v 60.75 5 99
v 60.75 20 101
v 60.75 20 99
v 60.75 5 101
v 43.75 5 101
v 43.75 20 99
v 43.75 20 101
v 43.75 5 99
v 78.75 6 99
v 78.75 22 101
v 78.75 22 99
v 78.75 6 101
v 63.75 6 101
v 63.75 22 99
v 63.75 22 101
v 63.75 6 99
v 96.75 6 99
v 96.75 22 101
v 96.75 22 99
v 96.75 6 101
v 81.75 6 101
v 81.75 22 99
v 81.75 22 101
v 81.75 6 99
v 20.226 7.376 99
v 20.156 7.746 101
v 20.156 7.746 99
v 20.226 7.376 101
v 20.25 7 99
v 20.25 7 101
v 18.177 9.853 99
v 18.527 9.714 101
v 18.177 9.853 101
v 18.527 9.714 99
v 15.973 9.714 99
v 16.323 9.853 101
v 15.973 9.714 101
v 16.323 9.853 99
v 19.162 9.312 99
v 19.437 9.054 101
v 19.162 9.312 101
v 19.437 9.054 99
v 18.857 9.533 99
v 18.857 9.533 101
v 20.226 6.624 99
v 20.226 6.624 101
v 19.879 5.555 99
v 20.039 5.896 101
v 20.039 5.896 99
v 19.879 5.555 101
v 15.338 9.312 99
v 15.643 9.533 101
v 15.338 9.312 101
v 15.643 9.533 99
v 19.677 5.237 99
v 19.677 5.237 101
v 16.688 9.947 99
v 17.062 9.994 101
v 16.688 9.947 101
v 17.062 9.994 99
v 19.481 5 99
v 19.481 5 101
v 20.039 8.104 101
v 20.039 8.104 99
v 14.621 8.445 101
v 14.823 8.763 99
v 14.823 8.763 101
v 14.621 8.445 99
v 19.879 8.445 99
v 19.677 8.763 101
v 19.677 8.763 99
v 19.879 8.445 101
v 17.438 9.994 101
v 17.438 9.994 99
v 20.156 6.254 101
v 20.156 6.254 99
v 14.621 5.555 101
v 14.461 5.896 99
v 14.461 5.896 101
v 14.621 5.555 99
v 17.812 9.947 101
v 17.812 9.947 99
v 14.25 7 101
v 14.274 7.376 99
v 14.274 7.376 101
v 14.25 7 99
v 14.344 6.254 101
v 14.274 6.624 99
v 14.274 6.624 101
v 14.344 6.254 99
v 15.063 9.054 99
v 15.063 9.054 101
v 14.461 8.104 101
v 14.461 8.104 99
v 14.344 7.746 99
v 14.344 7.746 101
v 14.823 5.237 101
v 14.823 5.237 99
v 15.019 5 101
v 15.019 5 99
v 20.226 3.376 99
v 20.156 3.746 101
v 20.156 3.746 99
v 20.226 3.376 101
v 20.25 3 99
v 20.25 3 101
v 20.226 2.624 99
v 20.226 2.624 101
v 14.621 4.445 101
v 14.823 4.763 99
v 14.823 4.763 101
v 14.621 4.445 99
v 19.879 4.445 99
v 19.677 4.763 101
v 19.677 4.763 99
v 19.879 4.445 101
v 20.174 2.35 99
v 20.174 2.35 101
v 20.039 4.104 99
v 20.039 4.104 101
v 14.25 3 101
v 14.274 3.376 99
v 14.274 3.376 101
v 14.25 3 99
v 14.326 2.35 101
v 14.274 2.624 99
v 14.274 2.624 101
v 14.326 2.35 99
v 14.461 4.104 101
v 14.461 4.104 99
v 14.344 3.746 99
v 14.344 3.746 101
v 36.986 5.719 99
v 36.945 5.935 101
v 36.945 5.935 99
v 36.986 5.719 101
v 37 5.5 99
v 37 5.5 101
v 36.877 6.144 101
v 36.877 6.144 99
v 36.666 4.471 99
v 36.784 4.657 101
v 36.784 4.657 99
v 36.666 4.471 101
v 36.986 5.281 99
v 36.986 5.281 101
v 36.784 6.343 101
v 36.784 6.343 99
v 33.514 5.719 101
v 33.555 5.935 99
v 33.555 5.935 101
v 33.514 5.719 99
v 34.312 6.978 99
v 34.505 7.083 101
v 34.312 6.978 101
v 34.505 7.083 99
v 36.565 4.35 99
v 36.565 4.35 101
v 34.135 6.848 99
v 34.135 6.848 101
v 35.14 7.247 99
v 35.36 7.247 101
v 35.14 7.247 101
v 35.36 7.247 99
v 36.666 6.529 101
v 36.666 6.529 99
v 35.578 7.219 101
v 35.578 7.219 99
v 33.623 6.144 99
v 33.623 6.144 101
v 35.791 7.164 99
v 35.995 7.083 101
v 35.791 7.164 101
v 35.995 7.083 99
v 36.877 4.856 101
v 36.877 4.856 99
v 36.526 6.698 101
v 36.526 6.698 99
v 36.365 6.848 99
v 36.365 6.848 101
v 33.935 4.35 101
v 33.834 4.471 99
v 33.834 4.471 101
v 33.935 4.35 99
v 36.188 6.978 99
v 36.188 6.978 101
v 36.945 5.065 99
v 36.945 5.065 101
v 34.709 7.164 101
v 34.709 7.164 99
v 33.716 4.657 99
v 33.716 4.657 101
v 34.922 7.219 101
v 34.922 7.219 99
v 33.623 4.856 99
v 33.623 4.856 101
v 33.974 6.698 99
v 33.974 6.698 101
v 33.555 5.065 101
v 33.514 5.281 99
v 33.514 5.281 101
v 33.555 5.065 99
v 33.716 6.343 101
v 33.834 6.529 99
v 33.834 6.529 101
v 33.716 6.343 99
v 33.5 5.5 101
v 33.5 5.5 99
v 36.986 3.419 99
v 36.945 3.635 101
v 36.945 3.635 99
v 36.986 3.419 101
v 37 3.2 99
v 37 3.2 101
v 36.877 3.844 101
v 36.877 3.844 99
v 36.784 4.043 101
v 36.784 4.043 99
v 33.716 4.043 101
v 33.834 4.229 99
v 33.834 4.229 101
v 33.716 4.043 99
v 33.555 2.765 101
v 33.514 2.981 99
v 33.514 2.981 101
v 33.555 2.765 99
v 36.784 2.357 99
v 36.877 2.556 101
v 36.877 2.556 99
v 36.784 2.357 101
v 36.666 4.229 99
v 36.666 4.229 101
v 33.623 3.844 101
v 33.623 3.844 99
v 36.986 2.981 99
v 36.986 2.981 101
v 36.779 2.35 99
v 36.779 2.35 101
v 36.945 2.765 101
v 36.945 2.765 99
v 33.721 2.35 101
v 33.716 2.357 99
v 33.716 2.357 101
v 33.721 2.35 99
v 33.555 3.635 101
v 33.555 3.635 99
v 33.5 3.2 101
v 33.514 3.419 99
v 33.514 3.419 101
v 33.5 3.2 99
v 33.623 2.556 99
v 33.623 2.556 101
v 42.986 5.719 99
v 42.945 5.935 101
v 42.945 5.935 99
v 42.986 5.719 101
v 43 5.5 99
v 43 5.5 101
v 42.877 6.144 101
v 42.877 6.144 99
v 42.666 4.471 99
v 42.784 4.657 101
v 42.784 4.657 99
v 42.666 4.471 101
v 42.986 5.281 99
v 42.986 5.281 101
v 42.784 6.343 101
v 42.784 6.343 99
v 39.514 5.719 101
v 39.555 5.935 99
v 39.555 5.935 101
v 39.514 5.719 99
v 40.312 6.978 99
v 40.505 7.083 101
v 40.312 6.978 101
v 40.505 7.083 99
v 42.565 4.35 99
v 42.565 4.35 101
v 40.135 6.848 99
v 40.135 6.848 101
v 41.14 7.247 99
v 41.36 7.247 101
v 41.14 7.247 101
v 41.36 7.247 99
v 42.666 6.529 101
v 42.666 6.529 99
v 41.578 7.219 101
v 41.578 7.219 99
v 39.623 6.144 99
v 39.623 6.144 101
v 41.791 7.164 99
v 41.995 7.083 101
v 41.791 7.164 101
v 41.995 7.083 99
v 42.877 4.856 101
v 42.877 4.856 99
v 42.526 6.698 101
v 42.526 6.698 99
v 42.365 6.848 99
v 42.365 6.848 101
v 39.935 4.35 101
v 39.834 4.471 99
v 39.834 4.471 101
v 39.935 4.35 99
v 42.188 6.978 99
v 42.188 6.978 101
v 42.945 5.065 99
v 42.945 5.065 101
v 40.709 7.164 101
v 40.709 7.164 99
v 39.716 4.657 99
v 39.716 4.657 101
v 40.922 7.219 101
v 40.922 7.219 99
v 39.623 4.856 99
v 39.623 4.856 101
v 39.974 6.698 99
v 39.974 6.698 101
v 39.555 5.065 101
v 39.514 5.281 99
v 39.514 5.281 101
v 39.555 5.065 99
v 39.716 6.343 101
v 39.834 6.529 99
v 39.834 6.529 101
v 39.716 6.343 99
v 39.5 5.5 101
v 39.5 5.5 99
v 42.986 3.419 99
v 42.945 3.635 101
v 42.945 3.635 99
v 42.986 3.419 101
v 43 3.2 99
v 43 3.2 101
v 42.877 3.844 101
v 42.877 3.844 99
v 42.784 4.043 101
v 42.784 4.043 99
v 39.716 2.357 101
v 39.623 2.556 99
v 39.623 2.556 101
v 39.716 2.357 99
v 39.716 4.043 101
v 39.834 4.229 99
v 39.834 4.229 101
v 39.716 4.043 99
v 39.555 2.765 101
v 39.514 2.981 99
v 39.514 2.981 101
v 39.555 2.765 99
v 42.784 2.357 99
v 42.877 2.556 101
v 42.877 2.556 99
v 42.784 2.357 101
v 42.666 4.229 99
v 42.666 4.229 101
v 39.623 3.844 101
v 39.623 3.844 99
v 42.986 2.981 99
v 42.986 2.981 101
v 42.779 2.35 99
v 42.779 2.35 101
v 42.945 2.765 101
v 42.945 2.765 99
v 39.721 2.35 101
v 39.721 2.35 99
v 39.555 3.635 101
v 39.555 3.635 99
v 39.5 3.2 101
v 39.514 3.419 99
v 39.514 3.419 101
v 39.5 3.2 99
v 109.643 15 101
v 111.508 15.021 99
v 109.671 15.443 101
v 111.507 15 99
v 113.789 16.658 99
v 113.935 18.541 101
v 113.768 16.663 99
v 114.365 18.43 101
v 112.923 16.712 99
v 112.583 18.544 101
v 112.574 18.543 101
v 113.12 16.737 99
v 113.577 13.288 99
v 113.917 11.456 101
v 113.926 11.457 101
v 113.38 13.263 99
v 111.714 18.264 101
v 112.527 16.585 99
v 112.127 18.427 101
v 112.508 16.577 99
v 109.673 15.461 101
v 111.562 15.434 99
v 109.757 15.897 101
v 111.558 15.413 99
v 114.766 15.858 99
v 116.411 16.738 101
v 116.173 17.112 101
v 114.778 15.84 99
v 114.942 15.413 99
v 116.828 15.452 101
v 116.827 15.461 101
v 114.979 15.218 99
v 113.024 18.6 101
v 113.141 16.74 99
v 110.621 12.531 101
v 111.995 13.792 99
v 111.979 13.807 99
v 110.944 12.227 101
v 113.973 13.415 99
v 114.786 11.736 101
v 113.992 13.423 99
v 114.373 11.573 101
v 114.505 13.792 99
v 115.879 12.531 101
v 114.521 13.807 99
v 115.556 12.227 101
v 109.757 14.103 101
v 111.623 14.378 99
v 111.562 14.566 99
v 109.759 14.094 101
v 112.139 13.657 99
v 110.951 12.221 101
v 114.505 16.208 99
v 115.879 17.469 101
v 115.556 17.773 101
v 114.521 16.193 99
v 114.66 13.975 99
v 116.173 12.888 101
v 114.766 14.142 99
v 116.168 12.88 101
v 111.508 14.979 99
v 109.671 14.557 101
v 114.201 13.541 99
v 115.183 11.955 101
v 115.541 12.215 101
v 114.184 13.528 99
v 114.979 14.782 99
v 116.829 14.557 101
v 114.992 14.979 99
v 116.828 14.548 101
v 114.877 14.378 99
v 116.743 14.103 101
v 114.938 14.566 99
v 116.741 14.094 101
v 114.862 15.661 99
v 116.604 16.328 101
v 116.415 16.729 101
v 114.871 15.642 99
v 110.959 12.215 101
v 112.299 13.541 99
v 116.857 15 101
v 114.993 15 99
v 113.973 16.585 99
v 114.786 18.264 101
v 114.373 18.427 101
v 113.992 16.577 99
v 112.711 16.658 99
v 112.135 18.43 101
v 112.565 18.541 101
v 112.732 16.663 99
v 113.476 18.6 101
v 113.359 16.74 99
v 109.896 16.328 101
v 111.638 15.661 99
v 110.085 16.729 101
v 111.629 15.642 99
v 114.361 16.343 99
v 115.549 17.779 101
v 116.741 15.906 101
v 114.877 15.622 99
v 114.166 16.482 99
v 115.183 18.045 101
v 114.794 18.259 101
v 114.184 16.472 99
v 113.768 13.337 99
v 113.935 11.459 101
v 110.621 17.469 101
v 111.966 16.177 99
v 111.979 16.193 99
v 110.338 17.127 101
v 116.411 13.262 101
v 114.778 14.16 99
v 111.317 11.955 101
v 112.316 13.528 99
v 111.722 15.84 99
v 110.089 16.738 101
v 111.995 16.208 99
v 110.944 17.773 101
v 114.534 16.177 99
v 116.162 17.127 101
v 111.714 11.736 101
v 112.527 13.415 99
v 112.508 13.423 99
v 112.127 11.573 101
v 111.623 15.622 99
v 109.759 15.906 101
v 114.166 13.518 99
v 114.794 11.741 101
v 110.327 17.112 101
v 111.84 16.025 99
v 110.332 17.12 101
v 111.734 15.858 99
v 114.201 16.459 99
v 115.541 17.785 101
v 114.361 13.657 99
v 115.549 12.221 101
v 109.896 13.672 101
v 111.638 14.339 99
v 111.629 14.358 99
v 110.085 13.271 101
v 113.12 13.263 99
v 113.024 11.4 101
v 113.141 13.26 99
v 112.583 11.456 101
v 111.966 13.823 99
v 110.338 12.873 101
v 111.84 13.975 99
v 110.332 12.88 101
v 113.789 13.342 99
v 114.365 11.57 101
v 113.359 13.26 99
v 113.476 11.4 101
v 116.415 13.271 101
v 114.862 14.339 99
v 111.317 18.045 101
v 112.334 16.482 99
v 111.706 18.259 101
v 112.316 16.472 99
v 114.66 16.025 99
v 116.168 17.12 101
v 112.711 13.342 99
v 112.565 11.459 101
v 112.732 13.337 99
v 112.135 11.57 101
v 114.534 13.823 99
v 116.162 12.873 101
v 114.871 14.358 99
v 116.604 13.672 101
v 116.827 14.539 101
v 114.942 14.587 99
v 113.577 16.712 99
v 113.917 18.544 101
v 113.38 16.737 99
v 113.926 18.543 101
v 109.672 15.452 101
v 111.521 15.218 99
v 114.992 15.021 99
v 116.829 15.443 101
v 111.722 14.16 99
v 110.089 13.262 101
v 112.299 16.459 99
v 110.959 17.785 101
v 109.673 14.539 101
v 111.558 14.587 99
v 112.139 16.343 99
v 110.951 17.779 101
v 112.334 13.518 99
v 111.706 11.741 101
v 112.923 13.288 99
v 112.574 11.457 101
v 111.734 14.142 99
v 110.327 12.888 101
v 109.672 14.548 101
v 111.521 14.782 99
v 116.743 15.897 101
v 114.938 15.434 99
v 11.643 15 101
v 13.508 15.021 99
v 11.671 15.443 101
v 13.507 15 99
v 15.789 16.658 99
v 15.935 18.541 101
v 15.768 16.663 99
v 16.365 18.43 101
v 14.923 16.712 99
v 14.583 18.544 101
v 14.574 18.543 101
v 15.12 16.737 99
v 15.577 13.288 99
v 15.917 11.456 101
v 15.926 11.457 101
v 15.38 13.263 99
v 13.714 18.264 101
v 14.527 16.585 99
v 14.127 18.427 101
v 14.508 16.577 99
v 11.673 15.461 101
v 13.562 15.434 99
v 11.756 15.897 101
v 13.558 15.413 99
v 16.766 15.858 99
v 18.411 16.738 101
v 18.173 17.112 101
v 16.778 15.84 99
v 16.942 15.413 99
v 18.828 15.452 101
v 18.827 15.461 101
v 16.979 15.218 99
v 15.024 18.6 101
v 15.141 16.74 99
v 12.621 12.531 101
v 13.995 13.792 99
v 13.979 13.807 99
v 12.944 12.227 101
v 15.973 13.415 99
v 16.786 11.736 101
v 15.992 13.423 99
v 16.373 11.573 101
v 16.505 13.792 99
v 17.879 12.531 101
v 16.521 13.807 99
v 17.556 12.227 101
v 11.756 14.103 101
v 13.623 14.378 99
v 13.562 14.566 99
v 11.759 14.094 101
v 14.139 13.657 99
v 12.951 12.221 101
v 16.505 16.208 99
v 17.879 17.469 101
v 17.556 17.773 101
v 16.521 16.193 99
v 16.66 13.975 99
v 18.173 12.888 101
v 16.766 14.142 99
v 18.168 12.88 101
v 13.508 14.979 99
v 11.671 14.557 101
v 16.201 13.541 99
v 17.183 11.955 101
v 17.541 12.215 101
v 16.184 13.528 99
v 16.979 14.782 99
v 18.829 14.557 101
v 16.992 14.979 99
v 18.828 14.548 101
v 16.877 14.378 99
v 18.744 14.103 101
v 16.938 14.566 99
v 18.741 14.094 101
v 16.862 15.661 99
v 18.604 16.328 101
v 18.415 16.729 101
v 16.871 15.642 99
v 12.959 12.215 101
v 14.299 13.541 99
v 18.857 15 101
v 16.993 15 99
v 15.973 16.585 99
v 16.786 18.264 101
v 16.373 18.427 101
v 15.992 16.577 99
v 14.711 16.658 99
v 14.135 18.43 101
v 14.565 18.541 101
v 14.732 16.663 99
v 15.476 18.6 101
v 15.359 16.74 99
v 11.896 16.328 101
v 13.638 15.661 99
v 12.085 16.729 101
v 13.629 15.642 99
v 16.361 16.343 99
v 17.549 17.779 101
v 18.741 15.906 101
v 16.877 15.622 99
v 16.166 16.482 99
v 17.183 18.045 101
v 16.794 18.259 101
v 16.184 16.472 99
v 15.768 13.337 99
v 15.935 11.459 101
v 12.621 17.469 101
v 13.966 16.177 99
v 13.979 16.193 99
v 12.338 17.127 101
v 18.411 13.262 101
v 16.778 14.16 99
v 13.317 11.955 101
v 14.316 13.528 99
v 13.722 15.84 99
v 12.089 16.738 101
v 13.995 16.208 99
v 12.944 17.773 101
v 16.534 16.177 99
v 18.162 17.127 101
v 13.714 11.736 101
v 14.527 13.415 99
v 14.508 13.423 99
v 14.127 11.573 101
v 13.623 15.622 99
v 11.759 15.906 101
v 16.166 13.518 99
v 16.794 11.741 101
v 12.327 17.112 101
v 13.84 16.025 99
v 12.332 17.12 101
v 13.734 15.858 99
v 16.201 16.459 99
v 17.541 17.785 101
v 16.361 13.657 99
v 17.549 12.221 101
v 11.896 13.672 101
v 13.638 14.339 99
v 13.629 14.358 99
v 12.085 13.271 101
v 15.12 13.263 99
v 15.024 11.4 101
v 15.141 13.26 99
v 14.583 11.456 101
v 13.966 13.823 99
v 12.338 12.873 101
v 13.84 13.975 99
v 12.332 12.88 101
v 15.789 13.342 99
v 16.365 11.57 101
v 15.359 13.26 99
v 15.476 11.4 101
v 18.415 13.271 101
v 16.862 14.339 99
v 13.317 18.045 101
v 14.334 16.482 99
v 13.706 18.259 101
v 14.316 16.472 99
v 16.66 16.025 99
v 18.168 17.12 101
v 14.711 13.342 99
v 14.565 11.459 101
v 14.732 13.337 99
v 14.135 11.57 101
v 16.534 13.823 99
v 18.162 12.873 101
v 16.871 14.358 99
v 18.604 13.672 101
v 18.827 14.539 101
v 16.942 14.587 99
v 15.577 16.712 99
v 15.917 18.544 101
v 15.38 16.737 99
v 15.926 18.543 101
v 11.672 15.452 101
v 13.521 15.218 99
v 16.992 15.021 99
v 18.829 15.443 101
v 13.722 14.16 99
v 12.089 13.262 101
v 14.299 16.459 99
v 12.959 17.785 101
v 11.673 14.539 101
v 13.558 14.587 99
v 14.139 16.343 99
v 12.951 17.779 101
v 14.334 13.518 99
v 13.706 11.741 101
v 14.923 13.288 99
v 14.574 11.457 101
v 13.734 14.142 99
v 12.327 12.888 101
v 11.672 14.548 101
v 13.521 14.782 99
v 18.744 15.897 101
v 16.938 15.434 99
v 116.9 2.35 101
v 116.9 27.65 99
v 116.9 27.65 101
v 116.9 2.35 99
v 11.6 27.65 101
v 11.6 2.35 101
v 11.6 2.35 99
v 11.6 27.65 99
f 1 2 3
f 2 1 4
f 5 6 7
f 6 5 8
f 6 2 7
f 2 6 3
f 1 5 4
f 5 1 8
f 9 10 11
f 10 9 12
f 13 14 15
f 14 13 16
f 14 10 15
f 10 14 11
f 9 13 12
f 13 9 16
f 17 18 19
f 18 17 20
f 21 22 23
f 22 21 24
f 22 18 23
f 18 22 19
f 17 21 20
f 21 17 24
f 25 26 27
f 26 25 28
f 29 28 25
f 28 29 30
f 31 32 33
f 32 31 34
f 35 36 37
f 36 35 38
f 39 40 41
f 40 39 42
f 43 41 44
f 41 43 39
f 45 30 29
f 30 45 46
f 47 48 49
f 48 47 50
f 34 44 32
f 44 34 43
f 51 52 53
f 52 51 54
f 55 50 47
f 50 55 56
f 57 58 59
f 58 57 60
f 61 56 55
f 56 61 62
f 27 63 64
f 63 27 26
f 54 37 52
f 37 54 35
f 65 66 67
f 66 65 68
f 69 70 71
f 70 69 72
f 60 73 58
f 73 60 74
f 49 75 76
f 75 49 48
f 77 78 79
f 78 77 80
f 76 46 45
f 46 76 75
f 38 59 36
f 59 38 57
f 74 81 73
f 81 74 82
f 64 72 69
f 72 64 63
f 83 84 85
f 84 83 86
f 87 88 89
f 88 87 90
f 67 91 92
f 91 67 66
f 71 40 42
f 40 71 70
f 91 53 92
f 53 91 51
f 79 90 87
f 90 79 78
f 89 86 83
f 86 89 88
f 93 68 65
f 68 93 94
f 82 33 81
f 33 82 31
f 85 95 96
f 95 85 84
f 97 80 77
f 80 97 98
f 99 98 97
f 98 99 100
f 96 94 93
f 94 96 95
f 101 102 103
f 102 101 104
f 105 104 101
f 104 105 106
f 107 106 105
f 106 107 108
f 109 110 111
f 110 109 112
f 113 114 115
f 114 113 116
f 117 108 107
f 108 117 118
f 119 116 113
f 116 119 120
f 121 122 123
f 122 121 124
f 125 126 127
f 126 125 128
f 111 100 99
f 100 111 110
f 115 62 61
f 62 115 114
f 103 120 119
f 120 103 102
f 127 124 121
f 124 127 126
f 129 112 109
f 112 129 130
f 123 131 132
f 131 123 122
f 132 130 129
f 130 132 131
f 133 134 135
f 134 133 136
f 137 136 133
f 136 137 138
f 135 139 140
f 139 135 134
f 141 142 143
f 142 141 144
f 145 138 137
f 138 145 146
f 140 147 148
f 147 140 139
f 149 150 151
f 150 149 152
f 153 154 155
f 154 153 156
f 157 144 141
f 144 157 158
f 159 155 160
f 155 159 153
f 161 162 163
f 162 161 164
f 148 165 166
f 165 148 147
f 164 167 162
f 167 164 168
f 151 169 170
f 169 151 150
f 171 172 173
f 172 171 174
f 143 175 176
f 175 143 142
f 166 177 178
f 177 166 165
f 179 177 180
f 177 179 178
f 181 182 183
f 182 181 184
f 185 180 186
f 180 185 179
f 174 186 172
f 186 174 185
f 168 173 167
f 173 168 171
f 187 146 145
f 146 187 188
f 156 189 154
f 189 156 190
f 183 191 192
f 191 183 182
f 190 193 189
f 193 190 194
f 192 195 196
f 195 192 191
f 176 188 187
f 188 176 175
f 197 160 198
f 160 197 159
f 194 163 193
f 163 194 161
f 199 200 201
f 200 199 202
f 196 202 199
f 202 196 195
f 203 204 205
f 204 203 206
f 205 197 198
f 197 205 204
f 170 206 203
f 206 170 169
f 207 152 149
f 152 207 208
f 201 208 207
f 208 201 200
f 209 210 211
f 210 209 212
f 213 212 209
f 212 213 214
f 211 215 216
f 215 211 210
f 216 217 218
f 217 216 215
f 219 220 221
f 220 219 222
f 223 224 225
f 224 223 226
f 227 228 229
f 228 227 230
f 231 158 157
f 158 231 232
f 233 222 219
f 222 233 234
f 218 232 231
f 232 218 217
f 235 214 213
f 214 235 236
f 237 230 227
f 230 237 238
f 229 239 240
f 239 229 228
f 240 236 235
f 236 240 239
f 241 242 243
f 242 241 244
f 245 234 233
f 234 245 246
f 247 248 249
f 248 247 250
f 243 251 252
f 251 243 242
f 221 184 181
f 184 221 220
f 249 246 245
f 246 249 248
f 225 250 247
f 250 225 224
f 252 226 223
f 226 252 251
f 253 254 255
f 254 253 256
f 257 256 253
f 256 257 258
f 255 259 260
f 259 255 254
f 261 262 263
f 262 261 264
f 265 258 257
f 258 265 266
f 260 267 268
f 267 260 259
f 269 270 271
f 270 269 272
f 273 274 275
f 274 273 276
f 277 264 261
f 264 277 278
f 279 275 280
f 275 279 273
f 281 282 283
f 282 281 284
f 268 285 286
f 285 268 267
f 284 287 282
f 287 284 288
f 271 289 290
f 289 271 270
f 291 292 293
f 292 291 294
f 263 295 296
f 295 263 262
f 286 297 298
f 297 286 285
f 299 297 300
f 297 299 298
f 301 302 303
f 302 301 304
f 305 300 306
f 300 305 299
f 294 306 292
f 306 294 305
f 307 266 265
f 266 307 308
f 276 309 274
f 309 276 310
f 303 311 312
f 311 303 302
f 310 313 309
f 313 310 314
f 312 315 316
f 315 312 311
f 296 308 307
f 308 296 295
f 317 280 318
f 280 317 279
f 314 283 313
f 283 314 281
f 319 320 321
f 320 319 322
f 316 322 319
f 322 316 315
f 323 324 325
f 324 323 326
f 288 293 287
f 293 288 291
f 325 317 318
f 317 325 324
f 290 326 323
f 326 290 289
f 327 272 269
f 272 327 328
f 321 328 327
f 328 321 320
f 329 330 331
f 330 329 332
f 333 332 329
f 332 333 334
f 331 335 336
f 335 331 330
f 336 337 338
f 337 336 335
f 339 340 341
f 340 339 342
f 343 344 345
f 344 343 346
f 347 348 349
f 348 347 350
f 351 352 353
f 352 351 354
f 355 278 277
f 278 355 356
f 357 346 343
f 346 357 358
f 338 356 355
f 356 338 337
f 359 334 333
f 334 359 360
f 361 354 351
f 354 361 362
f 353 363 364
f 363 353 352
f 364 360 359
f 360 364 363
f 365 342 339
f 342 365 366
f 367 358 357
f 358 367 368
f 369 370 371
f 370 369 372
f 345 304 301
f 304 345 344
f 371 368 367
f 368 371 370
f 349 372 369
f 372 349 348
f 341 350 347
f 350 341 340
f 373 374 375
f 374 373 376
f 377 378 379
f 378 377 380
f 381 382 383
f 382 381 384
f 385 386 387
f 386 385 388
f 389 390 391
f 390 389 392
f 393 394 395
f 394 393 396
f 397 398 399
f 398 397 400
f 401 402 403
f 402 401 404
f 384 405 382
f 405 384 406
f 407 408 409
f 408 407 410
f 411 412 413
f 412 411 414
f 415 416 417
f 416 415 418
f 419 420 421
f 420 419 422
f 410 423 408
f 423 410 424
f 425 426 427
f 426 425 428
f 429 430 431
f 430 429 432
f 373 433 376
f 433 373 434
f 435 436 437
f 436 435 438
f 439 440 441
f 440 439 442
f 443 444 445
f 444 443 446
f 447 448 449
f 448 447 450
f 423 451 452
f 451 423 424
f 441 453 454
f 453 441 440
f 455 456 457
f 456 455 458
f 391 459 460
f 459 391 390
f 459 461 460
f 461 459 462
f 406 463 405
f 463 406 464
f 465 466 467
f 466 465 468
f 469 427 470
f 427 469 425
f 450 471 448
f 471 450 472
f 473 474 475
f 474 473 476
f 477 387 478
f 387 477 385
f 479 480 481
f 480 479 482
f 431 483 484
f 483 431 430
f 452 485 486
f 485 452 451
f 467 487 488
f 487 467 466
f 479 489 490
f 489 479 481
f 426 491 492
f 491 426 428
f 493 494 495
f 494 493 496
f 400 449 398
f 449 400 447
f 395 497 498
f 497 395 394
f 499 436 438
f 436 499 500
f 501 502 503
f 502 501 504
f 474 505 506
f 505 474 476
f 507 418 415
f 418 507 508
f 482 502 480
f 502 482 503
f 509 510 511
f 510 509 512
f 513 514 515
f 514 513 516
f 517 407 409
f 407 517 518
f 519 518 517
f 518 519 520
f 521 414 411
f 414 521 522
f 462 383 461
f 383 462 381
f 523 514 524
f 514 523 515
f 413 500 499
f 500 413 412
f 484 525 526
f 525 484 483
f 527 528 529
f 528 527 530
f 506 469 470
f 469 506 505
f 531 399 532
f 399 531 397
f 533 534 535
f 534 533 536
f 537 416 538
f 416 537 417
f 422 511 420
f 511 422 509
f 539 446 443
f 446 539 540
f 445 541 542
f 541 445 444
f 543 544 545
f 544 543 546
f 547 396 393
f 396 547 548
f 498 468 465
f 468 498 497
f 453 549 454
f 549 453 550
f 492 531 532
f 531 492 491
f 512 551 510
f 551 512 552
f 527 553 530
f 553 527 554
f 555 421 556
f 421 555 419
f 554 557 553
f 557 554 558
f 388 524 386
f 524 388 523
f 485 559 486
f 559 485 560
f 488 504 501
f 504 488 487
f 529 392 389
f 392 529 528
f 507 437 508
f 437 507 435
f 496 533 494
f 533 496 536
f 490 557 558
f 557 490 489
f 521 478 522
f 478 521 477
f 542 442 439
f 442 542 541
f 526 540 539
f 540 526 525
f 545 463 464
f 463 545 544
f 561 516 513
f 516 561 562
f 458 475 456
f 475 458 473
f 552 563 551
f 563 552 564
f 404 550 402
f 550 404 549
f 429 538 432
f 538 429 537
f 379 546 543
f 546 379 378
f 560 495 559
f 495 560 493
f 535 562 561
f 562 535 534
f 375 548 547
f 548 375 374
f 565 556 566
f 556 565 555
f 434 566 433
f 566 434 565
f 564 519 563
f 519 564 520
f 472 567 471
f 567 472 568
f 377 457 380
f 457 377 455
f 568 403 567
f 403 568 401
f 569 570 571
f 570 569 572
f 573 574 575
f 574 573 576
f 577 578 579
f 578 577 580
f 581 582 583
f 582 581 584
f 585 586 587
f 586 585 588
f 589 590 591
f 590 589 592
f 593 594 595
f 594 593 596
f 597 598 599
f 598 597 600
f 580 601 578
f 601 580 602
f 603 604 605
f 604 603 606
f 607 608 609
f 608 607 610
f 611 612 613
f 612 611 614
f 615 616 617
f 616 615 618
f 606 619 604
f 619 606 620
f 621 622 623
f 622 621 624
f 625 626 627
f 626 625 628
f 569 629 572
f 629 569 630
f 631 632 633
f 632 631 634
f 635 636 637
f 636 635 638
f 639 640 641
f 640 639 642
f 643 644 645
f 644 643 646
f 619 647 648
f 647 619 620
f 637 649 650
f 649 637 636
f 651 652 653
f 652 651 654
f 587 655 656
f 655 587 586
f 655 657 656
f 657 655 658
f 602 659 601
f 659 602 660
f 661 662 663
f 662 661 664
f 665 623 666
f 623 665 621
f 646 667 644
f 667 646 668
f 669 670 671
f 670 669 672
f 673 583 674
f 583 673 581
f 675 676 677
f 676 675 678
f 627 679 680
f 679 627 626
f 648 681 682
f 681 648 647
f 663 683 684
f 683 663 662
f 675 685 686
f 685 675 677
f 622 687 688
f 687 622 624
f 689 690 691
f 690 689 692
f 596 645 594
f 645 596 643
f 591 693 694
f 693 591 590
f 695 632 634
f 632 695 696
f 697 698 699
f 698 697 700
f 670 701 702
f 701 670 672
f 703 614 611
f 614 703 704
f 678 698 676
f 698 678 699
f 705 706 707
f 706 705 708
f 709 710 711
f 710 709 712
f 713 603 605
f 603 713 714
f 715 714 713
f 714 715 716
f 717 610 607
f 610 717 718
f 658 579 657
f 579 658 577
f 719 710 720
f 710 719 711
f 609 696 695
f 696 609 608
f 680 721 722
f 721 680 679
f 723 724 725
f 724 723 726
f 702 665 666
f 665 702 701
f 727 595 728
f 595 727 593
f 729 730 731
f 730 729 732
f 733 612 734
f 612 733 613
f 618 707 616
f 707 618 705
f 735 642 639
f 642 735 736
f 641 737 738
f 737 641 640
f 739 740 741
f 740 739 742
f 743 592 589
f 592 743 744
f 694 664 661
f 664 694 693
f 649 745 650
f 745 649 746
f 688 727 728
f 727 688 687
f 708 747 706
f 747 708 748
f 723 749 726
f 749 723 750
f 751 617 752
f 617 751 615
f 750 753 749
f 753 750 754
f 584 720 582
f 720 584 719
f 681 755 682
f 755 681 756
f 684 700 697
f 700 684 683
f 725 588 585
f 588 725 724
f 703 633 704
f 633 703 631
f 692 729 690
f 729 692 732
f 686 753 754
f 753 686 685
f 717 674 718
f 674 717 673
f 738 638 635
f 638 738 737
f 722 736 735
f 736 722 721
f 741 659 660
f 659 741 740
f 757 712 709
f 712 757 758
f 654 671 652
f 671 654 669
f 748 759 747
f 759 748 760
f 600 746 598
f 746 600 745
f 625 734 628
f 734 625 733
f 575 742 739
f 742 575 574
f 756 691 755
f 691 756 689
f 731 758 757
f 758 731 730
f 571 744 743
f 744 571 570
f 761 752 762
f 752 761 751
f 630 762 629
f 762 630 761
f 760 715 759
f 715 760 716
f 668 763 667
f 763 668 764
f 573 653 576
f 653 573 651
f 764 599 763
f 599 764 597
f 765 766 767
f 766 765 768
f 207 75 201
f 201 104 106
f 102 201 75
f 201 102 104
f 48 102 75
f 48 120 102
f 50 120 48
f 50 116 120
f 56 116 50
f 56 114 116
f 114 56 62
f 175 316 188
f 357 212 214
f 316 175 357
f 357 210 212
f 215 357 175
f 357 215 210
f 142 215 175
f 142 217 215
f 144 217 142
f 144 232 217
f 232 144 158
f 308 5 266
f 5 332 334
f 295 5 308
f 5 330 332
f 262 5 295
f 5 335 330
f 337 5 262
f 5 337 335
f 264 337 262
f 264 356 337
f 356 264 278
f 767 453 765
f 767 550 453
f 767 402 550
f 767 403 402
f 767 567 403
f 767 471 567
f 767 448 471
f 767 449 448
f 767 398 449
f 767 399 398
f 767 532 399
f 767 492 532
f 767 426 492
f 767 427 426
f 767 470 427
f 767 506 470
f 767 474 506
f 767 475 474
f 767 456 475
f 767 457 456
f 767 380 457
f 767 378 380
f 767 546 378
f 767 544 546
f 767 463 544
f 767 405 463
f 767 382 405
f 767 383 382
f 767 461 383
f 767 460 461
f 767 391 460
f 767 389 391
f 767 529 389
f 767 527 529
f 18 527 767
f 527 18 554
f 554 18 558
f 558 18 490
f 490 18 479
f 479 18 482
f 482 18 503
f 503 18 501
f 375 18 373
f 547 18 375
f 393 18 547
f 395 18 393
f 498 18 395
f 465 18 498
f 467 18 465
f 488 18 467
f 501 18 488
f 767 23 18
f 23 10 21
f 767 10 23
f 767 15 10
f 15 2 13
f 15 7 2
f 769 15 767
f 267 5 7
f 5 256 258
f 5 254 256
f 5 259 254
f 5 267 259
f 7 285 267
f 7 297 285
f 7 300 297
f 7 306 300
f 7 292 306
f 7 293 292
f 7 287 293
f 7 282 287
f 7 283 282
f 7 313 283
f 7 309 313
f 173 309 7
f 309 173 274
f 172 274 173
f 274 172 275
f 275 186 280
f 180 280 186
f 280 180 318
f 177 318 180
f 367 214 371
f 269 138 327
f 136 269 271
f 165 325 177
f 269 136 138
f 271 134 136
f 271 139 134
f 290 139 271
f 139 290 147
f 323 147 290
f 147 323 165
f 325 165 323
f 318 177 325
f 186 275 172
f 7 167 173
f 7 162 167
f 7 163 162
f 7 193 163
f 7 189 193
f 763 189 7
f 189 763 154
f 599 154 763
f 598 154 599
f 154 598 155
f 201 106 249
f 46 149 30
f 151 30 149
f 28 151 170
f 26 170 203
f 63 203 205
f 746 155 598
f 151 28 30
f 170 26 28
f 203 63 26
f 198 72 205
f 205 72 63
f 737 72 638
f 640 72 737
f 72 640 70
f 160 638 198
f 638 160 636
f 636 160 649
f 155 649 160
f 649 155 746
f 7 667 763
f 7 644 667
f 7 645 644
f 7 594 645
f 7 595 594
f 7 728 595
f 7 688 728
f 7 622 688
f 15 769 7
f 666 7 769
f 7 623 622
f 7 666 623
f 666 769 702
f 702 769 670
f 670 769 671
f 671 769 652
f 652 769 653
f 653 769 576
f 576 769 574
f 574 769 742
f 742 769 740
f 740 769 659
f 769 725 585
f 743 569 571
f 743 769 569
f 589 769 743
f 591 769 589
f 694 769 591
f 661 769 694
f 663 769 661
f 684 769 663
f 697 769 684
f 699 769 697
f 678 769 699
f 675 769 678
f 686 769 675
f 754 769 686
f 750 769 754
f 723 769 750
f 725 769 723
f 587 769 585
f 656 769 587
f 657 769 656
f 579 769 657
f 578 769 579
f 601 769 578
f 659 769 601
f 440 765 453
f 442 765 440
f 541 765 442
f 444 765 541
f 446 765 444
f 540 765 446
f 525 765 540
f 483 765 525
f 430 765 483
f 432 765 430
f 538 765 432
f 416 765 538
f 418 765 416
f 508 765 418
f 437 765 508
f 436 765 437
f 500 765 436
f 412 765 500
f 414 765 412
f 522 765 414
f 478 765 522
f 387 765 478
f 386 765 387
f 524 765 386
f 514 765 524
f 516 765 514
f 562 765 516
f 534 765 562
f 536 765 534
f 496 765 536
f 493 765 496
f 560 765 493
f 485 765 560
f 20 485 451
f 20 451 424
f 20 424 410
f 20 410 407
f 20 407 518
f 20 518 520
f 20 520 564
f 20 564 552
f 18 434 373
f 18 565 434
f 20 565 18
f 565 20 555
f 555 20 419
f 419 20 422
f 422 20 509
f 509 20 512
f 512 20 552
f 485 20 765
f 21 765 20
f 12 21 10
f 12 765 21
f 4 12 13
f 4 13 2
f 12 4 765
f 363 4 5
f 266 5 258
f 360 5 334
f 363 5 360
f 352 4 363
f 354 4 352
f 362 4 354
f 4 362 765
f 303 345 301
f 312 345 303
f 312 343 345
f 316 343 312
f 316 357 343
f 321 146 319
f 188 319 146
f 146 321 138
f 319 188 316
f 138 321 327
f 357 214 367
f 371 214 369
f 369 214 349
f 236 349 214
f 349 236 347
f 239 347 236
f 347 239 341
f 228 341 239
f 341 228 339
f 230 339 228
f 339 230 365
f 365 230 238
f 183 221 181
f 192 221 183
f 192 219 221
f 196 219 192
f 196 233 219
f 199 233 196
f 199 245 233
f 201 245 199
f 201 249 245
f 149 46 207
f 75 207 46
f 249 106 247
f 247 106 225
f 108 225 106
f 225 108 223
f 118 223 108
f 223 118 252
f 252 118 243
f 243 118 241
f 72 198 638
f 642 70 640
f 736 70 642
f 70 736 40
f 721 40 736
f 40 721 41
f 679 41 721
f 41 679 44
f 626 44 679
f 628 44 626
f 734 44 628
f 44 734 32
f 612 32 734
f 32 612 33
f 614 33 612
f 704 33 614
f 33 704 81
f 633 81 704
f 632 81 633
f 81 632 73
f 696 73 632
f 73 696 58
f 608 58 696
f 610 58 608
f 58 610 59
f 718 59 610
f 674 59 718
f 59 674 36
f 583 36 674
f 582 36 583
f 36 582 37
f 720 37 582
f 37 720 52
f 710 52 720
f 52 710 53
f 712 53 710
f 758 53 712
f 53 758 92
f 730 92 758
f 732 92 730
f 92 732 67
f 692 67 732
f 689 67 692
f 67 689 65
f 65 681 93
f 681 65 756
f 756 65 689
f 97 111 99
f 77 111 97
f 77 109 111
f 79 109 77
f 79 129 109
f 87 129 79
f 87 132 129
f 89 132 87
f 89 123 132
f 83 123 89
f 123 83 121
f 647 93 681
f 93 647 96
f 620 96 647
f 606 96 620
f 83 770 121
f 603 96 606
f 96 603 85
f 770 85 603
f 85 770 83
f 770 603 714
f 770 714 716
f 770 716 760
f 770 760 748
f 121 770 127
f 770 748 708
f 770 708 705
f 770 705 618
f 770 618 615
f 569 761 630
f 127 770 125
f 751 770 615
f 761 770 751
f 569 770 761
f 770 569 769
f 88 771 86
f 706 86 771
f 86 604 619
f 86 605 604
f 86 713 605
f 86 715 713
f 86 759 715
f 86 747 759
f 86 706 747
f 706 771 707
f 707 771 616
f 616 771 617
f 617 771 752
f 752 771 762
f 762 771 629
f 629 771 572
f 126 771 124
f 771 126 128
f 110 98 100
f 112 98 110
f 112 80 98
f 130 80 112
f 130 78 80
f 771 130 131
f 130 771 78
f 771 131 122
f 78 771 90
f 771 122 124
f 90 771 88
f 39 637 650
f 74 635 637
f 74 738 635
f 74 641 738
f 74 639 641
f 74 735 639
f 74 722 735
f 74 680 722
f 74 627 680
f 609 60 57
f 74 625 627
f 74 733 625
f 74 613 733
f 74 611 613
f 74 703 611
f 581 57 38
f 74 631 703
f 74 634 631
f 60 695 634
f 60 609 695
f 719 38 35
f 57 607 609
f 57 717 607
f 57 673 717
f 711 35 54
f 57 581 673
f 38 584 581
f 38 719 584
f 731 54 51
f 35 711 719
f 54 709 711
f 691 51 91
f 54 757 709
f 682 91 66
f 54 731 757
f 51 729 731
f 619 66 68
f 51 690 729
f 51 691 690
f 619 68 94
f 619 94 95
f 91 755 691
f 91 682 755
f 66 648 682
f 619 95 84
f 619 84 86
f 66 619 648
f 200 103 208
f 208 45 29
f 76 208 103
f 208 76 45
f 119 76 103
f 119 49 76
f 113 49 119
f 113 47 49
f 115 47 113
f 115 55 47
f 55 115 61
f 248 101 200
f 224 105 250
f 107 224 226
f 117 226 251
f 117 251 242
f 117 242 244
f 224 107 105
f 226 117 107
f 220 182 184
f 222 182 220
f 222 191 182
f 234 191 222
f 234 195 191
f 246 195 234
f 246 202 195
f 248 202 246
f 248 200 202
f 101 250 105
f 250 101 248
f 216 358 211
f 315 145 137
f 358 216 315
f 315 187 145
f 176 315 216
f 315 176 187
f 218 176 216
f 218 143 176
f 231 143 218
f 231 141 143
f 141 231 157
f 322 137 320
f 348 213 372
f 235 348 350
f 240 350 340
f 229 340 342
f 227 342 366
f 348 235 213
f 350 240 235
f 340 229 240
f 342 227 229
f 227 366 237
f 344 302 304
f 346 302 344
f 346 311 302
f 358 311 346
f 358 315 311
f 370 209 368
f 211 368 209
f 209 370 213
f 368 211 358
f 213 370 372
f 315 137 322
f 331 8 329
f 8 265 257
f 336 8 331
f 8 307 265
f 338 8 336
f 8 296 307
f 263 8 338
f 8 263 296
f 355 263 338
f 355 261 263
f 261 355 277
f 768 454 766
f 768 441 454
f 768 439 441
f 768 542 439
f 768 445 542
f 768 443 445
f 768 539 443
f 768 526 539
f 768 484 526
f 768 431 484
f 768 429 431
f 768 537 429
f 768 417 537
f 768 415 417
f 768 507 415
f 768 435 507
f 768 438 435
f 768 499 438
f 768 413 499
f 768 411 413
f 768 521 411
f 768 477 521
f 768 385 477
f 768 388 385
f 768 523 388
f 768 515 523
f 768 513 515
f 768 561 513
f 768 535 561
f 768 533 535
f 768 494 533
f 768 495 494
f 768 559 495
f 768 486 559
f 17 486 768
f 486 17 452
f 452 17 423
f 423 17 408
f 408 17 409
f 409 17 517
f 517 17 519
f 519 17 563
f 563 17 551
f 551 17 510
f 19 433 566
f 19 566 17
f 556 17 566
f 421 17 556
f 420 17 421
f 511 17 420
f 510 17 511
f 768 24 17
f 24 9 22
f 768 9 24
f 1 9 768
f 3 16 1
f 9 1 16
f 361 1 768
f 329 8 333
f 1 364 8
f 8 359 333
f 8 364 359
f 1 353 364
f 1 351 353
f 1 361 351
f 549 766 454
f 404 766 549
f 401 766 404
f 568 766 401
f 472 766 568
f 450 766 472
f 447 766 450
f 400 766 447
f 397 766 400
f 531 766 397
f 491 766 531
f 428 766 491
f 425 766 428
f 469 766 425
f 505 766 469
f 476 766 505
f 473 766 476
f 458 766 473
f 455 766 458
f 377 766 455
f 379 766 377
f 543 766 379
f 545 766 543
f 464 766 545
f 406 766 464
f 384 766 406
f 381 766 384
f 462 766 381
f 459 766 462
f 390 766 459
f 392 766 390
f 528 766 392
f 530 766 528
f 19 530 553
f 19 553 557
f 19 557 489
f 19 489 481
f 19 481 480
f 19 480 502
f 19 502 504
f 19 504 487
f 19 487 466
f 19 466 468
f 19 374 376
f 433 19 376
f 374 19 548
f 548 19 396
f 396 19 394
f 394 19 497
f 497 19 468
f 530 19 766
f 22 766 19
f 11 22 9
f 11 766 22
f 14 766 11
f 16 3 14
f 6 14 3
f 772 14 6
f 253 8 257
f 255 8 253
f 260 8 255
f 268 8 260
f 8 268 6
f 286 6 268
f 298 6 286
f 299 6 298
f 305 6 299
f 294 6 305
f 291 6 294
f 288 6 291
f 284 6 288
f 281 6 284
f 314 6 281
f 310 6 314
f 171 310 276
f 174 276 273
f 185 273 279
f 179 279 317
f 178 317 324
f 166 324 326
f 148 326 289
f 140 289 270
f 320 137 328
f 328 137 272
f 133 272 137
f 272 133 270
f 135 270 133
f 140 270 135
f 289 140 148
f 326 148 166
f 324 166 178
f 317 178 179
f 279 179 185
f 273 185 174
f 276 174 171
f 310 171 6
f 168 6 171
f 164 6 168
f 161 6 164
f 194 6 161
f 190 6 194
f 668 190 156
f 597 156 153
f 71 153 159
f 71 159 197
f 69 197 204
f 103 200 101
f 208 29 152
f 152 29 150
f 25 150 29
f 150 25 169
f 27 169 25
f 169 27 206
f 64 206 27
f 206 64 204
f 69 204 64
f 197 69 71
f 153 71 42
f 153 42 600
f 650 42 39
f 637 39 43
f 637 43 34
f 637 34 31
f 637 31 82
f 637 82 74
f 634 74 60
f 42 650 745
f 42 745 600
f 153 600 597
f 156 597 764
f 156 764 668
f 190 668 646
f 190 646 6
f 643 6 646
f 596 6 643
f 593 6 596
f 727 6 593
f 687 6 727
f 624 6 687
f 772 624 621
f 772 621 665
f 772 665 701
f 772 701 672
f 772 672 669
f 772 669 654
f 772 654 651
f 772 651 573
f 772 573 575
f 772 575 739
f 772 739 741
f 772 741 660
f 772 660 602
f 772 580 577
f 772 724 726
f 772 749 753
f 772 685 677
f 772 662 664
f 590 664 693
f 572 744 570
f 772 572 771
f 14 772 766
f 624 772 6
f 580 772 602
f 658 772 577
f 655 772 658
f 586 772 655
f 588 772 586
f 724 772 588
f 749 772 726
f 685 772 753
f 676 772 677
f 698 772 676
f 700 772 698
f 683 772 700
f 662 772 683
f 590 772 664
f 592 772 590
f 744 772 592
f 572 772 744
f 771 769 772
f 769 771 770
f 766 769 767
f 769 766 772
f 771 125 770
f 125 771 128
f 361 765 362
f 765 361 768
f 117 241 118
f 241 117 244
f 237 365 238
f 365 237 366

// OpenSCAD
/* Raspberry Pi Eurorack Enclosure Generator 
 * Modified for purpose by @realtimekodi
 * https://github.com/Real-Time-Kodi/EuroServerRack/
 * Initially designed by KronBjorn
 * https://github.com/KronBjorn/SixInchRack
 * 
 * Creative Commons 4.0 Share Alike With Attribution -- Non-Comercial
 * http://creativecommons.org/licenses/by-nc-sa/4.0/
*/
include<../sixinch_library.scad>


  ///////////////////////////////
 // Raspberry Pi 3 Model B    //
///////////////////////////////

print_frontplate_sml = false;
print_handle_sml     = false;
print_cabinet_sml    = false;
print_lid            = false;
print_rear           = true;

if(print_frontplate_sml){ // Frontplate //
    square_hole        = [];
    round_hole         = [[65 ,7.5, 3.1],[69.5 ,7.5, 3.1]];
    round_peg          = [];   
    screw_side_front   = [3];
    screw_top          = [];
    screw_bottom_front = [];
    units              = 6; 
    frontplate(units,square_hole,round_hole,round_peg,screw_side_front,screw_top,screw_bottom_front);

}

if(print_handle_sml){ // Handle // 
    units              = 6;
    lay_flat_for_print = false;   
    handle(units,lay_flat_for_print);
}

if(print_cabinet_sml){ // Cabinet //  
    w=94;
    h=70;
    screw_bottom_front = [];
    screw_side_front   = [3];
    round_peg          = [[w,h,6,2.8,4],
                          [w-49,h,6,2.8,4],
                          [w-49,h-58,6,2.8,4],
                          [w,h-58,6,2.8,4]];
    depth              = 98;
    units              = 6;
    cabinet(depth,units,screw_bottom_front,round_peg,screw_side_front);
}

if(print_lid){ // Lid // 
    depth = 98;
    units = 6;
    screw_front = [];//mm
    screw_back  = [];//mm
    lid(98,6,screw_front,screw_back);        
}

if(print_rear){  // Back plate //    
    w=4.5;
    square_hole  = [[37-w ,3, 17, 15] , [57-w ,4, 15, 16] , [75-w,4,15,16] ];
    round_hole   = [[6,5,6],[6,1,6], [24,3.5,3.5],[24,1.2,3.5]  ,[30,3.5,3.5],[30,1.2,3.5]];
    screw_top    = [];//mm
    screw_bottom = [];//mm
    screw_side   = [3];
    depth        = 98;
    units        = 6;
    back_plate(units,depth,screw_top,screw_bottom,screw_side,square_hole,round_hole);
}  
